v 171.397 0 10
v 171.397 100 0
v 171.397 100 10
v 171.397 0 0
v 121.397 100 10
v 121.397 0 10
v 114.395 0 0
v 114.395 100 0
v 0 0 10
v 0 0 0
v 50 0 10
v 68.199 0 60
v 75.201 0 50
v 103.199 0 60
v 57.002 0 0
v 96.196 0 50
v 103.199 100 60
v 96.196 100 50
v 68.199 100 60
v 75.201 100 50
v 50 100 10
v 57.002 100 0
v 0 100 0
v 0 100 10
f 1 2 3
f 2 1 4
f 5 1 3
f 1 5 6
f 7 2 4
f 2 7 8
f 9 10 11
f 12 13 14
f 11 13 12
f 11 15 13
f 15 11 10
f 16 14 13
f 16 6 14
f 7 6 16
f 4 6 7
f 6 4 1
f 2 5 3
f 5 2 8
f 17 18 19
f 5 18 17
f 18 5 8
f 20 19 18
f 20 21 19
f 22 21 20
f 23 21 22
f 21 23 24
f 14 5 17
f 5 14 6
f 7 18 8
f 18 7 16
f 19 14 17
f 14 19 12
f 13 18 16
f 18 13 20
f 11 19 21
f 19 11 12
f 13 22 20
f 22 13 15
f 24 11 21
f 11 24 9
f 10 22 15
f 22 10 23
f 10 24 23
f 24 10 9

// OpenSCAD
$fn=100;
$vpt=[85,70,0];
$vpr=[60,0,0];
$vpd=400;
use <../../lib.scad>

length=160;
plate_up_length=50/sin(70);
bent_plate([50,
						70,plate_up_length,
						-70,35,
						-70,plate_up_length,
						70,50],
					 thickness=10,
					 width=100,
					 sirface="top");
